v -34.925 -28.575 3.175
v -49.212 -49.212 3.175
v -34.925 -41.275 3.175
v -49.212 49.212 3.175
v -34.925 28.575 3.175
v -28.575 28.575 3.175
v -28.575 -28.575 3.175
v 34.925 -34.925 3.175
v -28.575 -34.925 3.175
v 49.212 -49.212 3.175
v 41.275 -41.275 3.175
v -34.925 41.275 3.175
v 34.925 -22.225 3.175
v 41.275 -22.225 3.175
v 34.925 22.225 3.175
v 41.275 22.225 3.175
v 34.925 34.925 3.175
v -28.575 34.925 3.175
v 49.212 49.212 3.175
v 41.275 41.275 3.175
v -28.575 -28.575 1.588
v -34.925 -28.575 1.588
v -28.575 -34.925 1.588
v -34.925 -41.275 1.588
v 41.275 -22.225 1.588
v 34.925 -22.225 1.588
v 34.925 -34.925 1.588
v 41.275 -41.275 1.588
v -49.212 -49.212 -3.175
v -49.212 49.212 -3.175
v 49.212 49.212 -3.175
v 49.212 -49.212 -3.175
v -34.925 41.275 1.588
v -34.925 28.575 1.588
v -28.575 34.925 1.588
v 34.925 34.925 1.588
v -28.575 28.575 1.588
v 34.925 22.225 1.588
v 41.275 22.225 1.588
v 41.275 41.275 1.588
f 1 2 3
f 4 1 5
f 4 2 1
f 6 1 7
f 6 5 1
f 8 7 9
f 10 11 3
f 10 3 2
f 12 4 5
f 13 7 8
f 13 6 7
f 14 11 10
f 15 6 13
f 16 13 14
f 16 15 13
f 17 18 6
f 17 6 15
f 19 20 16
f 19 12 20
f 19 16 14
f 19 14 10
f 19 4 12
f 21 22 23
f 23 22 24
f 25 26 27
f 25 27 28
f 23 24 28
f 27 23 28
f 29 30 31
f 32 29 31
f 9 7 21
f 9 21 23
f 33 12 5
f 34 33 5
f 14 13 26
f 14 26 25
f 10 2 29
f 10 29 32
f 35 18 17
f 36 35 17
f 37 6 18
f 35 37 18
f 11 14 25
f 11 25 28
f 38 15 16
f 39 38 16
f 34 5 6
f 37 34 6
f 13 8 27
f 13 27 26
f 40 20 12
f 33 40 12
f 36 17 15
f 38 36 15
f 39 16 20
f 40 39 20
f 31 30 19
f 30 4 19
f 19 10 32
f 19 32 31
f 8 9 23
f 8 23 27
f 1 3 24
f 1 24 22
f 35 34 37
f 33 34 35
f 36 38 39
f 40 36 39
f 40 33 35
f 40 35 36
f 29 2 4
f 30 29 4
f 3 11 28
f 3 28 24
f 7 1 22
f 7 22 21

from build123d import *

# Parameters (mm, degrees)
F0_W     = 98.425
F0_H     = 98.425
F1_DEPTH = 3.175
F3_DEPTH = 1.5875


# Not quite as in the source:
# - a pattern or mirror of a feature is missing from the dataset's text; its kind, count and spacing are read off the source's solid


with BuildPart() as f1:
    # F0 (on Top) → F1 (new body, symmetric)
    with BuildSketch(Plane.XY):
        Rectangle(F0_W, F0_H)
    extrude(amount=F1_DEPTH, both=True)

    # F2 (on face) → F3 (cut, symmetric)
    with BuildSketch(Plane.XY.offset(3.175)):
        Polygon((41.275, 22.225), (41.275, 41.275), (-34.925, 41.275), (-34.925, 28.575), (-28.575, 28.575), (-28.575, 34.925), (34.925, 34.925), (34.925, 22.225), align=None)
    f3 = extrude(amount=F3_DEPTH, both=True, mode=Mode.SUBTRACT)

    # F3_copies: F3 across plane
    add(f3.mirror(Plane(origin=(0, 0, 0), x_dir=(0, 0, -1), z_dir=(0, -1, 0))), mode=Mode.SUBTRACT)


solid = f1.part
